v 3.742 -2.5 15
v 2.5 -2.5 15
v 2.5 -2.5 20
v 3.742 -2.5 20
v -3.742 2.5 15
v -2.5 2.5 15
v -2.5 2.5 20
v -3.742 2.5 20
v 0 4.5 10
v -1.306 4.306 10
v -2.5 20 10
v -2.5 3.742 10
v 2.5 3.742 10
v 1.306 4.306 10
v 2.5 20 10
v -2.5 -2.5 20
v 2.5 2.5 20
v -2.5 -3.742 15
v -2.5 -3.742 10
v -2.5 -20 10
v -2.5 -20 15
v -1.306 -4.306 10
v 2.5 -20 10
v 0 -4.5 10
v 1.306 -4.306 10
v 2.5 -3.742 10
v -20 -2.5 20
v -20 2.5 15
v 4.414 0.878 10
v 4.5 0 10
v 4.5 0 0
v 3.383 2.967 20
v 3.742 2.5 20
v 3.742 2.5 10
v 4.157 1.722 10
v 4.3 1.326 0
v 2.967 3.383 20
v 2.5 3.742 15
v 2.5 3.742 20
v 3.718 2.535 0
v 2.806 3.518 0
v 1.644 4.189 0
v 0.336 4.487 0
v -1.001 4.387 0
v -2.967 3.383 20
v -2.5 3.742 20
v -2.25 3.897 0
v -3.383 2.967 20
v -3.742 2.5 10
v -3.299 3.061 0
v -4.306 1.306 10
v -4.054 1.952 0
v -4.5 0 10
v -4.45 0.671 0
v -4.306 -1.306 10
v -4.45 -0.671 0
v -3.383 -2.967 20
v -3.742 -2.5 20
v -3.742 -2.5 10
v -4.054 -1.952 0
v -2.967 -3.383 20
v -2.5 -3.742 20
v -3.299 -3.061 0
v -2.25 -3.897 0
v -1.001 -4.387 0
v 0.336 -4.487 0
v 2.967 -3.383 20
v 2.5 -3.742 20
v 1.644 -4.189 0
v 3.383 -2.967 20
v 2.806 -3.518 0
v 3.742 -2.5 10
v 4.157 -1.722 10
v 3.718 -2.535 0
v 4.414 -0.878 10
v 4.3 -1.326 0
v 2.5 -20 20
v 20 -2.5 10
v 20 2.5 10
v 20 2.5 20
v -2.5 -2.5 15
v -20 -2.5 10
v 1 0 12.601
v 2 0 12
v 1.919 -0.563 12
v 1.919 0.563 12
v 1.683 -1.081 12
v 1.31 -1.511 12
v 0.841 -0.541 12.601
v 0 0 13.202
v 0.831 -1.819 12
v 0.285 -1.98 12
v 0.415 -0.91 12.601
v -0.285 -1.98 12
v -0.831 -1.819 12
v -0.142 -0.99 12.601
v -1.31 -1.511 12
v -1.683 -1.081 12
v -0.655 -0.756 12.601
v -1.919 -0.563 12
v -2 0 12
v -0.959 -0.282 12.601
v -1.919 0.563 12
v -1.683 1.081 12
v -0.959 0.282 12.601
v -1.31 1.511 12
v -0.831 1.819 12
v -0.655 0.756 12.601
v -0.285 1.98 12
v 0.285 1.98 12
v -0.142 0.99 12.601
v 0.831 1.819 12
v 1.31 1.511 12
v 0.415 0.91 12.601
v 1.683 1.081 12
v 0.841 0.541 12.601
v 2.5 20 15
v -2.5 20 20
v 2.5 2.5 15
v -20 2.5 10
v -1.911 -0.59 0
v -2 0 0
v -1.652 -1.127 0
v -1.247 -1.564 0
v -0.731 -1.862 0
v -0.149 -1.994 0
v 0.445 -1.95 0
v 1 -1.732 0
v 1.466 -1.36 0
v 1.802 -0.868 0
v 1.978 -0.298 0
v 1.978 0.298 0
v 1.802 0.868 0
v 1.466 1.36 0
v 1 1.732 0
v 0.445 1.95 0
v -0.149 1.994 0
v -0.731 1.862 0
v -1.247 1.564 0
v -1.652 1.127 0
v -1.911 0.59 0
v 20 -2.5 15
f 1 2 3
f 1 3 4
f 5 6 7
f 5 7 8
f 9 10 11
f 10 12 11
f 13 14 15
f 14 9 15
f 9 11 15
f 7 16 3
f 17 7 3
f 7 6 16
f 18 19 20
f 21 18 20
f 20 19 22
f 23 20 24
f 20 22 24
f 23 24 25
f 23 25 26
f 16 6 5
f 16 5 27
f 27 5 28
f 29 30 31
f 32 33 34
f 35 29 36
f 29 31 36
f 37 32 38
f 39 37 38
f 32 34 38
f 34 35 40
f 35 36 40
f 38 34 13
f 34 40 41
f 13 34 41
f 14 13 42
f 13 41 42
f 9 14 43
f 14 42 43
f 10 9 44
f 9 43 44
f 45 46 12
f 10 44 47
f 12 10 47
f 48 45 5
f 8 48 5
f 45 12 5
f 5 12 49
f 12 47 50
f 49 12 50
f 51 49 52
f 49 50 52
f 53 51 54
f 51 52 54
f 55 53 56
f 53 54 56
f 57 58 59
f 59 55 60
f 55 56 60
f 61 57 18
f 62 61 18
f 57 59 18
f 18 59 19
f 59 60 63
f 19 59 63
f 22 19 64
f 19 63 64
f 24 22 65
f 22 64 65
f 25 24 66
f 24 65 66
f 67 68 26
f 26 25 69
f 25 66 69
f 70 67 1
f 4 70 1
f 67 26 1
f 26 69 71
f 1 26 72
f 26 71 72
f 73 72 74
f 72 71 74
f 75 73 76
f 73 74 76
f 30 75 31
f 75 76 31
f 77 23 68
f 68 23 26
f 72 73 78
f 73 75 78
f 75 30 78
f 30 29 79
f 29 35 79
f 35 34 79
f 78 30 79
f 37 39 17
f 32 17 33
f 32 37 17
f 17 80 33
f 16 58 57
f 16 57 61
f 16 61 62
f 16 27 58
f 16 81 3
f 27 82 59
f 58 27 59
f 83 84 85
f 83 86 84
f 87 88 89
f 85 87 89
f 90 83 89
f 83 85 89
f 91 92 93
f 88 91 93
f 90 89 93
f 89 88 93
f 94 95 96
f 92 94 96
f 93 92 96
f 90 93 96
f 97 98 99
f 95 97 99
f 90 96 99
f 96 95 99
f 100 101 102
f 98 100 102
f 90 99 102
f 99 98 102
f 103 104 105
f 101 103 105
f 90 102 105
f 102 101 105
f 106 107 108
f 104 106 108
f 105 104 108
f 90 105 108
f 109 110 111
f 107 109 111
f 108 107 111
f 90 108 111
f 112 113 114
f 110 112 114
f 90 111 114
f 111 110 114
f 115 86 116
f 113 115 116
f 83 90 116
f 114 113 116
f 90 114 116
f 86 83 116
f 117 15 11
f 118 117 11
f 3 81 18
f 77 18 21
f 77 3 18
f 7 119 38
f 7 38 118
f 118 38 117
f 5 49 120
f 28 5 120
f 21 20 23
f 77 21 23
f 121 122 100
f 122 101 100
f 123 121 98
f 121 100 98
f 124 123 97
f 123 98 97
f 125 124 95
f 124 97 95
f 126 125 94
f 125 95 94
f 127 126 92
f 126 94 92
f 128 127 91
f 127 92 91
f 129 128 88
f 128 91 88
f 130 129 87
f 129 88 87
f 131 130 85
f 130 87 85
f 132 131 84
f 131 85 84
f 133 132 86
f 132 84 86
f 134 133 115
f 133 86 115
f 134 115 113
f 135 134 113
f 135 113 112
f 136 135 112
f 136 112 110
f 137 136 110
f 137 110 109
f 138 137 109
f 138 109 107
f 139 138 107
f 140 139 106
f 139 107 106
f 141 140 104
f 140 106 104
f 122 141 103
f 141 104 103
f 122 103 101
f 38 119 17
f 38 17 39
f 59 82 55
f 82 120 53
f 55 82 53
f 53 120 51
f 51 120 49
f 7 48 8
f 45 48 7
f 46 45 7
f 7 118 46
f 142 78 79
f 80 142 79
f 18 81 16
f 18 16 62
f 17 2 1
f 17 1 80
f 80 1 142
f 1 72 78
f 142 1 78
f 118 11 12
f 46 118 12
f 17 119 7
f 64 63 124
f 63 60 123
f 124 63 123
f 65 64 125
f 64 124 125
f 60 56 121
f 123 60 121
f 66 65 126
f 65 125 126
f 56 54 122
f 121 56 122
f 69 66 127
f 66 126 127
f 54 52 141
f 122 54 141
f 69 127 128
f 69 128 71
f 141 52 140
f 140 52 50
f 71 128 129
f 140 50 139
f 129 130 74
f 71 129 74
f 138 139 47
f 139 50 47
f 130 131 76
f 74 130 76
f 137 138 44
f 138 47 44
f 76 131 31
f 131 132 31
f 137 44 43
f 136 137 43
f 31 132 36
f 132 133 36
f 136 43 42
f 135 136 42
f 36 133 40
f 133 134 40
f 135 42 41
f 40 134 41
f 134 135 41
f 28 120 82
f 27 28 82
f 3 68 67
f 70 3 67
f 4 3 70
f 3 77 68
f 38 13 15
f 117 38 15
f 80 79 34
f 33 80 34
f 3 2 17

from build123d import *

# Parameters (mm, degrees)
F0_R     = 4.5
F1_DEPTH = 10
F2_W     = 5
F2_H     = 5
F3_DEPTH = 10
F4_SIZE  = 4.99999
F5_DEPTH = 10
F7_D     = 4
F7_DEPTH = 12
F7_TIP   = 1.2017212381


# Not quite as in the source:
# - a fillet or chamfer is up to 0.001 mm smaller than in the source, because OpenCascade refuses the exact size


with BuildPart() as f1:
    # F0 (on Top) → F1 (new body)
    with BuildSketch(Plane.XY):
        Circle(F0_R)
    extrude(amount=F1_DEPTH)

    # F2 (on face) → F3 (join)
    with BuildSketch(Plane.XY.offset(10)):
        with BuildLine():
            ThreePointArc((2.5, -3.7416573868), (0, -4.5), (-2.5, -3.7416573868))
            Line((-2.5, -3.7416573868), (-2.5, -20))
            Line((-2.5, -20), (2.5, -20))
            Line((2.5, -20), (2.5, -3.7416573868))
        make_face()
        with BuildLine():
            Line((-3.7416573868, 2.5), (-20, 2.5))
            Line((-20, 2.5), (-20, -2.5))
            Line((-20, -2.5), (-3.7416573868, -2.5))
            ThreePointArc((-3.7416573868, -2.5), (-4.5, 0), (-3.7416573868, 2.5))
        make_face()
        with BuildLine():
            Line((-2.5, 20), (-2.5, 3.7416573868))
            ThreePointArc((-2.5, 3.7416573868), (0, 4.5), (2.5, 3.7416573868))
            Line((2.5, 3.7416573868), (2.5, 20))
            Line((2.5, 20), (-2.5, 20))
        make_face()
        with BuildLine():
            Line((20, 2.5), (3.7416573868, 2.5))
            ThreePointArc((3.7416573868, 2.5), (4.3062430401, 1.3062430401), (4.5, 0))
            ThreePointArc((4.5, 0), (4.3062430401, -1.3062430401), (3.7416573868, -2.5))
            Line((3.7416573868, -2.5), (20, -2.5))
            Line((20, -2.5), (20, 2.5))
        make_face()
        with BuildLine():
            Line((3.7416573868, 2.5), (2.5, 2.5))
            Line((2.5, 2.5), (2.5, -2.5))
            Line((2.5, -2.5), (3.7416573868, -2.5))
            ThreePointArc((3.7416573868, -2.5), (4.3062430401, -1.3062430401), (4.5, 0))
            ThreePointArc((4.5, 0), (4.3062430401, 1.3062430401), (3.7416573868, 2.5))
        make_face()
        Rectangle(F2_W, F2_H)
        with BuildLine():
            Line((2.5, -2.5), (-2.5, -2.5))
            Line((-2.5, -2.5), (-2.5, -3.7416573868))
            ThreePointArc((-2.5, -3.7416573868), (0, -4.5), (2.5, -3.7416573868))
            Line((2.5, -3.7416573868), (2.5, -2.5))
        make_face()
        with BuildLine():
            Line((-2.5, 2.5), (-3.7416573868, 2.5))
            ThreePointArc((-3.7416573868, 2.5), (-4.5, 0), (-3.7416573868, -2.5))
            Line((-3.7416573868, -2.5), (-2.5, -2.5))
            Line((-2.5, -2.5), (-2.5, 2.5))
        make_face()
        with BuildLine():
            Line((-2.5, 3.7416573868), (-2.5, 2.5))
            Line((-2.5, 2.5), (2.5, 2.5))
            Line((2.5, 2.5), (2.5, 3.7416573868))
            ThreePointArc((2.5, 3.7416573868), (0, 4.5), (-2.5, 3.7416573868))
        make_face()
    extrude(amount=F3_DEPTH)

    # F4 (size 5 in the source; OpenCascade refuses exactly that, so slightly less here)
    f4_edges = [f1.edges().sort_by_distance(p)[0] for p in [
        (-2.5, -11.25, 20),
        (-11.25, 2.5, 20),
        (2.5, 11.25, 20),
        (11.25, -2.5, 20),
    ]]
    chamfer(f4_edges, length=F4_SIZE)

    # F5 (add): faces of the model
    f5_faces = [f1.faces().sort_by_distance(p)[0] for p in [
        (-2.940797231, 2.940797231, 10),
        (2.940797231, 2.940797231, 10),
        (2.940797231, -2.940797231, 10),
        (-2.940797231, -2.940797231, 10),
    ]]
    extrude(f5_faces, amount=F5_DEPTH)

    # F7
    with Locations(Plane(origin=(0, 0, 0), x_dir=(1, 0, 0), z_dir=(0, 0, -1))):
        with Locations((0, 0)):
            Hole(F7_D / 2, depth=F7_DEPTH)
            with Locations((0, 0, -(F7_DEPTH + F7_TIP / 2))):  # 118° drill point
                Cone(0, F7_D / 2, F7_TIP, mode=Mode.SUBTRACT)


solid = f1.part
